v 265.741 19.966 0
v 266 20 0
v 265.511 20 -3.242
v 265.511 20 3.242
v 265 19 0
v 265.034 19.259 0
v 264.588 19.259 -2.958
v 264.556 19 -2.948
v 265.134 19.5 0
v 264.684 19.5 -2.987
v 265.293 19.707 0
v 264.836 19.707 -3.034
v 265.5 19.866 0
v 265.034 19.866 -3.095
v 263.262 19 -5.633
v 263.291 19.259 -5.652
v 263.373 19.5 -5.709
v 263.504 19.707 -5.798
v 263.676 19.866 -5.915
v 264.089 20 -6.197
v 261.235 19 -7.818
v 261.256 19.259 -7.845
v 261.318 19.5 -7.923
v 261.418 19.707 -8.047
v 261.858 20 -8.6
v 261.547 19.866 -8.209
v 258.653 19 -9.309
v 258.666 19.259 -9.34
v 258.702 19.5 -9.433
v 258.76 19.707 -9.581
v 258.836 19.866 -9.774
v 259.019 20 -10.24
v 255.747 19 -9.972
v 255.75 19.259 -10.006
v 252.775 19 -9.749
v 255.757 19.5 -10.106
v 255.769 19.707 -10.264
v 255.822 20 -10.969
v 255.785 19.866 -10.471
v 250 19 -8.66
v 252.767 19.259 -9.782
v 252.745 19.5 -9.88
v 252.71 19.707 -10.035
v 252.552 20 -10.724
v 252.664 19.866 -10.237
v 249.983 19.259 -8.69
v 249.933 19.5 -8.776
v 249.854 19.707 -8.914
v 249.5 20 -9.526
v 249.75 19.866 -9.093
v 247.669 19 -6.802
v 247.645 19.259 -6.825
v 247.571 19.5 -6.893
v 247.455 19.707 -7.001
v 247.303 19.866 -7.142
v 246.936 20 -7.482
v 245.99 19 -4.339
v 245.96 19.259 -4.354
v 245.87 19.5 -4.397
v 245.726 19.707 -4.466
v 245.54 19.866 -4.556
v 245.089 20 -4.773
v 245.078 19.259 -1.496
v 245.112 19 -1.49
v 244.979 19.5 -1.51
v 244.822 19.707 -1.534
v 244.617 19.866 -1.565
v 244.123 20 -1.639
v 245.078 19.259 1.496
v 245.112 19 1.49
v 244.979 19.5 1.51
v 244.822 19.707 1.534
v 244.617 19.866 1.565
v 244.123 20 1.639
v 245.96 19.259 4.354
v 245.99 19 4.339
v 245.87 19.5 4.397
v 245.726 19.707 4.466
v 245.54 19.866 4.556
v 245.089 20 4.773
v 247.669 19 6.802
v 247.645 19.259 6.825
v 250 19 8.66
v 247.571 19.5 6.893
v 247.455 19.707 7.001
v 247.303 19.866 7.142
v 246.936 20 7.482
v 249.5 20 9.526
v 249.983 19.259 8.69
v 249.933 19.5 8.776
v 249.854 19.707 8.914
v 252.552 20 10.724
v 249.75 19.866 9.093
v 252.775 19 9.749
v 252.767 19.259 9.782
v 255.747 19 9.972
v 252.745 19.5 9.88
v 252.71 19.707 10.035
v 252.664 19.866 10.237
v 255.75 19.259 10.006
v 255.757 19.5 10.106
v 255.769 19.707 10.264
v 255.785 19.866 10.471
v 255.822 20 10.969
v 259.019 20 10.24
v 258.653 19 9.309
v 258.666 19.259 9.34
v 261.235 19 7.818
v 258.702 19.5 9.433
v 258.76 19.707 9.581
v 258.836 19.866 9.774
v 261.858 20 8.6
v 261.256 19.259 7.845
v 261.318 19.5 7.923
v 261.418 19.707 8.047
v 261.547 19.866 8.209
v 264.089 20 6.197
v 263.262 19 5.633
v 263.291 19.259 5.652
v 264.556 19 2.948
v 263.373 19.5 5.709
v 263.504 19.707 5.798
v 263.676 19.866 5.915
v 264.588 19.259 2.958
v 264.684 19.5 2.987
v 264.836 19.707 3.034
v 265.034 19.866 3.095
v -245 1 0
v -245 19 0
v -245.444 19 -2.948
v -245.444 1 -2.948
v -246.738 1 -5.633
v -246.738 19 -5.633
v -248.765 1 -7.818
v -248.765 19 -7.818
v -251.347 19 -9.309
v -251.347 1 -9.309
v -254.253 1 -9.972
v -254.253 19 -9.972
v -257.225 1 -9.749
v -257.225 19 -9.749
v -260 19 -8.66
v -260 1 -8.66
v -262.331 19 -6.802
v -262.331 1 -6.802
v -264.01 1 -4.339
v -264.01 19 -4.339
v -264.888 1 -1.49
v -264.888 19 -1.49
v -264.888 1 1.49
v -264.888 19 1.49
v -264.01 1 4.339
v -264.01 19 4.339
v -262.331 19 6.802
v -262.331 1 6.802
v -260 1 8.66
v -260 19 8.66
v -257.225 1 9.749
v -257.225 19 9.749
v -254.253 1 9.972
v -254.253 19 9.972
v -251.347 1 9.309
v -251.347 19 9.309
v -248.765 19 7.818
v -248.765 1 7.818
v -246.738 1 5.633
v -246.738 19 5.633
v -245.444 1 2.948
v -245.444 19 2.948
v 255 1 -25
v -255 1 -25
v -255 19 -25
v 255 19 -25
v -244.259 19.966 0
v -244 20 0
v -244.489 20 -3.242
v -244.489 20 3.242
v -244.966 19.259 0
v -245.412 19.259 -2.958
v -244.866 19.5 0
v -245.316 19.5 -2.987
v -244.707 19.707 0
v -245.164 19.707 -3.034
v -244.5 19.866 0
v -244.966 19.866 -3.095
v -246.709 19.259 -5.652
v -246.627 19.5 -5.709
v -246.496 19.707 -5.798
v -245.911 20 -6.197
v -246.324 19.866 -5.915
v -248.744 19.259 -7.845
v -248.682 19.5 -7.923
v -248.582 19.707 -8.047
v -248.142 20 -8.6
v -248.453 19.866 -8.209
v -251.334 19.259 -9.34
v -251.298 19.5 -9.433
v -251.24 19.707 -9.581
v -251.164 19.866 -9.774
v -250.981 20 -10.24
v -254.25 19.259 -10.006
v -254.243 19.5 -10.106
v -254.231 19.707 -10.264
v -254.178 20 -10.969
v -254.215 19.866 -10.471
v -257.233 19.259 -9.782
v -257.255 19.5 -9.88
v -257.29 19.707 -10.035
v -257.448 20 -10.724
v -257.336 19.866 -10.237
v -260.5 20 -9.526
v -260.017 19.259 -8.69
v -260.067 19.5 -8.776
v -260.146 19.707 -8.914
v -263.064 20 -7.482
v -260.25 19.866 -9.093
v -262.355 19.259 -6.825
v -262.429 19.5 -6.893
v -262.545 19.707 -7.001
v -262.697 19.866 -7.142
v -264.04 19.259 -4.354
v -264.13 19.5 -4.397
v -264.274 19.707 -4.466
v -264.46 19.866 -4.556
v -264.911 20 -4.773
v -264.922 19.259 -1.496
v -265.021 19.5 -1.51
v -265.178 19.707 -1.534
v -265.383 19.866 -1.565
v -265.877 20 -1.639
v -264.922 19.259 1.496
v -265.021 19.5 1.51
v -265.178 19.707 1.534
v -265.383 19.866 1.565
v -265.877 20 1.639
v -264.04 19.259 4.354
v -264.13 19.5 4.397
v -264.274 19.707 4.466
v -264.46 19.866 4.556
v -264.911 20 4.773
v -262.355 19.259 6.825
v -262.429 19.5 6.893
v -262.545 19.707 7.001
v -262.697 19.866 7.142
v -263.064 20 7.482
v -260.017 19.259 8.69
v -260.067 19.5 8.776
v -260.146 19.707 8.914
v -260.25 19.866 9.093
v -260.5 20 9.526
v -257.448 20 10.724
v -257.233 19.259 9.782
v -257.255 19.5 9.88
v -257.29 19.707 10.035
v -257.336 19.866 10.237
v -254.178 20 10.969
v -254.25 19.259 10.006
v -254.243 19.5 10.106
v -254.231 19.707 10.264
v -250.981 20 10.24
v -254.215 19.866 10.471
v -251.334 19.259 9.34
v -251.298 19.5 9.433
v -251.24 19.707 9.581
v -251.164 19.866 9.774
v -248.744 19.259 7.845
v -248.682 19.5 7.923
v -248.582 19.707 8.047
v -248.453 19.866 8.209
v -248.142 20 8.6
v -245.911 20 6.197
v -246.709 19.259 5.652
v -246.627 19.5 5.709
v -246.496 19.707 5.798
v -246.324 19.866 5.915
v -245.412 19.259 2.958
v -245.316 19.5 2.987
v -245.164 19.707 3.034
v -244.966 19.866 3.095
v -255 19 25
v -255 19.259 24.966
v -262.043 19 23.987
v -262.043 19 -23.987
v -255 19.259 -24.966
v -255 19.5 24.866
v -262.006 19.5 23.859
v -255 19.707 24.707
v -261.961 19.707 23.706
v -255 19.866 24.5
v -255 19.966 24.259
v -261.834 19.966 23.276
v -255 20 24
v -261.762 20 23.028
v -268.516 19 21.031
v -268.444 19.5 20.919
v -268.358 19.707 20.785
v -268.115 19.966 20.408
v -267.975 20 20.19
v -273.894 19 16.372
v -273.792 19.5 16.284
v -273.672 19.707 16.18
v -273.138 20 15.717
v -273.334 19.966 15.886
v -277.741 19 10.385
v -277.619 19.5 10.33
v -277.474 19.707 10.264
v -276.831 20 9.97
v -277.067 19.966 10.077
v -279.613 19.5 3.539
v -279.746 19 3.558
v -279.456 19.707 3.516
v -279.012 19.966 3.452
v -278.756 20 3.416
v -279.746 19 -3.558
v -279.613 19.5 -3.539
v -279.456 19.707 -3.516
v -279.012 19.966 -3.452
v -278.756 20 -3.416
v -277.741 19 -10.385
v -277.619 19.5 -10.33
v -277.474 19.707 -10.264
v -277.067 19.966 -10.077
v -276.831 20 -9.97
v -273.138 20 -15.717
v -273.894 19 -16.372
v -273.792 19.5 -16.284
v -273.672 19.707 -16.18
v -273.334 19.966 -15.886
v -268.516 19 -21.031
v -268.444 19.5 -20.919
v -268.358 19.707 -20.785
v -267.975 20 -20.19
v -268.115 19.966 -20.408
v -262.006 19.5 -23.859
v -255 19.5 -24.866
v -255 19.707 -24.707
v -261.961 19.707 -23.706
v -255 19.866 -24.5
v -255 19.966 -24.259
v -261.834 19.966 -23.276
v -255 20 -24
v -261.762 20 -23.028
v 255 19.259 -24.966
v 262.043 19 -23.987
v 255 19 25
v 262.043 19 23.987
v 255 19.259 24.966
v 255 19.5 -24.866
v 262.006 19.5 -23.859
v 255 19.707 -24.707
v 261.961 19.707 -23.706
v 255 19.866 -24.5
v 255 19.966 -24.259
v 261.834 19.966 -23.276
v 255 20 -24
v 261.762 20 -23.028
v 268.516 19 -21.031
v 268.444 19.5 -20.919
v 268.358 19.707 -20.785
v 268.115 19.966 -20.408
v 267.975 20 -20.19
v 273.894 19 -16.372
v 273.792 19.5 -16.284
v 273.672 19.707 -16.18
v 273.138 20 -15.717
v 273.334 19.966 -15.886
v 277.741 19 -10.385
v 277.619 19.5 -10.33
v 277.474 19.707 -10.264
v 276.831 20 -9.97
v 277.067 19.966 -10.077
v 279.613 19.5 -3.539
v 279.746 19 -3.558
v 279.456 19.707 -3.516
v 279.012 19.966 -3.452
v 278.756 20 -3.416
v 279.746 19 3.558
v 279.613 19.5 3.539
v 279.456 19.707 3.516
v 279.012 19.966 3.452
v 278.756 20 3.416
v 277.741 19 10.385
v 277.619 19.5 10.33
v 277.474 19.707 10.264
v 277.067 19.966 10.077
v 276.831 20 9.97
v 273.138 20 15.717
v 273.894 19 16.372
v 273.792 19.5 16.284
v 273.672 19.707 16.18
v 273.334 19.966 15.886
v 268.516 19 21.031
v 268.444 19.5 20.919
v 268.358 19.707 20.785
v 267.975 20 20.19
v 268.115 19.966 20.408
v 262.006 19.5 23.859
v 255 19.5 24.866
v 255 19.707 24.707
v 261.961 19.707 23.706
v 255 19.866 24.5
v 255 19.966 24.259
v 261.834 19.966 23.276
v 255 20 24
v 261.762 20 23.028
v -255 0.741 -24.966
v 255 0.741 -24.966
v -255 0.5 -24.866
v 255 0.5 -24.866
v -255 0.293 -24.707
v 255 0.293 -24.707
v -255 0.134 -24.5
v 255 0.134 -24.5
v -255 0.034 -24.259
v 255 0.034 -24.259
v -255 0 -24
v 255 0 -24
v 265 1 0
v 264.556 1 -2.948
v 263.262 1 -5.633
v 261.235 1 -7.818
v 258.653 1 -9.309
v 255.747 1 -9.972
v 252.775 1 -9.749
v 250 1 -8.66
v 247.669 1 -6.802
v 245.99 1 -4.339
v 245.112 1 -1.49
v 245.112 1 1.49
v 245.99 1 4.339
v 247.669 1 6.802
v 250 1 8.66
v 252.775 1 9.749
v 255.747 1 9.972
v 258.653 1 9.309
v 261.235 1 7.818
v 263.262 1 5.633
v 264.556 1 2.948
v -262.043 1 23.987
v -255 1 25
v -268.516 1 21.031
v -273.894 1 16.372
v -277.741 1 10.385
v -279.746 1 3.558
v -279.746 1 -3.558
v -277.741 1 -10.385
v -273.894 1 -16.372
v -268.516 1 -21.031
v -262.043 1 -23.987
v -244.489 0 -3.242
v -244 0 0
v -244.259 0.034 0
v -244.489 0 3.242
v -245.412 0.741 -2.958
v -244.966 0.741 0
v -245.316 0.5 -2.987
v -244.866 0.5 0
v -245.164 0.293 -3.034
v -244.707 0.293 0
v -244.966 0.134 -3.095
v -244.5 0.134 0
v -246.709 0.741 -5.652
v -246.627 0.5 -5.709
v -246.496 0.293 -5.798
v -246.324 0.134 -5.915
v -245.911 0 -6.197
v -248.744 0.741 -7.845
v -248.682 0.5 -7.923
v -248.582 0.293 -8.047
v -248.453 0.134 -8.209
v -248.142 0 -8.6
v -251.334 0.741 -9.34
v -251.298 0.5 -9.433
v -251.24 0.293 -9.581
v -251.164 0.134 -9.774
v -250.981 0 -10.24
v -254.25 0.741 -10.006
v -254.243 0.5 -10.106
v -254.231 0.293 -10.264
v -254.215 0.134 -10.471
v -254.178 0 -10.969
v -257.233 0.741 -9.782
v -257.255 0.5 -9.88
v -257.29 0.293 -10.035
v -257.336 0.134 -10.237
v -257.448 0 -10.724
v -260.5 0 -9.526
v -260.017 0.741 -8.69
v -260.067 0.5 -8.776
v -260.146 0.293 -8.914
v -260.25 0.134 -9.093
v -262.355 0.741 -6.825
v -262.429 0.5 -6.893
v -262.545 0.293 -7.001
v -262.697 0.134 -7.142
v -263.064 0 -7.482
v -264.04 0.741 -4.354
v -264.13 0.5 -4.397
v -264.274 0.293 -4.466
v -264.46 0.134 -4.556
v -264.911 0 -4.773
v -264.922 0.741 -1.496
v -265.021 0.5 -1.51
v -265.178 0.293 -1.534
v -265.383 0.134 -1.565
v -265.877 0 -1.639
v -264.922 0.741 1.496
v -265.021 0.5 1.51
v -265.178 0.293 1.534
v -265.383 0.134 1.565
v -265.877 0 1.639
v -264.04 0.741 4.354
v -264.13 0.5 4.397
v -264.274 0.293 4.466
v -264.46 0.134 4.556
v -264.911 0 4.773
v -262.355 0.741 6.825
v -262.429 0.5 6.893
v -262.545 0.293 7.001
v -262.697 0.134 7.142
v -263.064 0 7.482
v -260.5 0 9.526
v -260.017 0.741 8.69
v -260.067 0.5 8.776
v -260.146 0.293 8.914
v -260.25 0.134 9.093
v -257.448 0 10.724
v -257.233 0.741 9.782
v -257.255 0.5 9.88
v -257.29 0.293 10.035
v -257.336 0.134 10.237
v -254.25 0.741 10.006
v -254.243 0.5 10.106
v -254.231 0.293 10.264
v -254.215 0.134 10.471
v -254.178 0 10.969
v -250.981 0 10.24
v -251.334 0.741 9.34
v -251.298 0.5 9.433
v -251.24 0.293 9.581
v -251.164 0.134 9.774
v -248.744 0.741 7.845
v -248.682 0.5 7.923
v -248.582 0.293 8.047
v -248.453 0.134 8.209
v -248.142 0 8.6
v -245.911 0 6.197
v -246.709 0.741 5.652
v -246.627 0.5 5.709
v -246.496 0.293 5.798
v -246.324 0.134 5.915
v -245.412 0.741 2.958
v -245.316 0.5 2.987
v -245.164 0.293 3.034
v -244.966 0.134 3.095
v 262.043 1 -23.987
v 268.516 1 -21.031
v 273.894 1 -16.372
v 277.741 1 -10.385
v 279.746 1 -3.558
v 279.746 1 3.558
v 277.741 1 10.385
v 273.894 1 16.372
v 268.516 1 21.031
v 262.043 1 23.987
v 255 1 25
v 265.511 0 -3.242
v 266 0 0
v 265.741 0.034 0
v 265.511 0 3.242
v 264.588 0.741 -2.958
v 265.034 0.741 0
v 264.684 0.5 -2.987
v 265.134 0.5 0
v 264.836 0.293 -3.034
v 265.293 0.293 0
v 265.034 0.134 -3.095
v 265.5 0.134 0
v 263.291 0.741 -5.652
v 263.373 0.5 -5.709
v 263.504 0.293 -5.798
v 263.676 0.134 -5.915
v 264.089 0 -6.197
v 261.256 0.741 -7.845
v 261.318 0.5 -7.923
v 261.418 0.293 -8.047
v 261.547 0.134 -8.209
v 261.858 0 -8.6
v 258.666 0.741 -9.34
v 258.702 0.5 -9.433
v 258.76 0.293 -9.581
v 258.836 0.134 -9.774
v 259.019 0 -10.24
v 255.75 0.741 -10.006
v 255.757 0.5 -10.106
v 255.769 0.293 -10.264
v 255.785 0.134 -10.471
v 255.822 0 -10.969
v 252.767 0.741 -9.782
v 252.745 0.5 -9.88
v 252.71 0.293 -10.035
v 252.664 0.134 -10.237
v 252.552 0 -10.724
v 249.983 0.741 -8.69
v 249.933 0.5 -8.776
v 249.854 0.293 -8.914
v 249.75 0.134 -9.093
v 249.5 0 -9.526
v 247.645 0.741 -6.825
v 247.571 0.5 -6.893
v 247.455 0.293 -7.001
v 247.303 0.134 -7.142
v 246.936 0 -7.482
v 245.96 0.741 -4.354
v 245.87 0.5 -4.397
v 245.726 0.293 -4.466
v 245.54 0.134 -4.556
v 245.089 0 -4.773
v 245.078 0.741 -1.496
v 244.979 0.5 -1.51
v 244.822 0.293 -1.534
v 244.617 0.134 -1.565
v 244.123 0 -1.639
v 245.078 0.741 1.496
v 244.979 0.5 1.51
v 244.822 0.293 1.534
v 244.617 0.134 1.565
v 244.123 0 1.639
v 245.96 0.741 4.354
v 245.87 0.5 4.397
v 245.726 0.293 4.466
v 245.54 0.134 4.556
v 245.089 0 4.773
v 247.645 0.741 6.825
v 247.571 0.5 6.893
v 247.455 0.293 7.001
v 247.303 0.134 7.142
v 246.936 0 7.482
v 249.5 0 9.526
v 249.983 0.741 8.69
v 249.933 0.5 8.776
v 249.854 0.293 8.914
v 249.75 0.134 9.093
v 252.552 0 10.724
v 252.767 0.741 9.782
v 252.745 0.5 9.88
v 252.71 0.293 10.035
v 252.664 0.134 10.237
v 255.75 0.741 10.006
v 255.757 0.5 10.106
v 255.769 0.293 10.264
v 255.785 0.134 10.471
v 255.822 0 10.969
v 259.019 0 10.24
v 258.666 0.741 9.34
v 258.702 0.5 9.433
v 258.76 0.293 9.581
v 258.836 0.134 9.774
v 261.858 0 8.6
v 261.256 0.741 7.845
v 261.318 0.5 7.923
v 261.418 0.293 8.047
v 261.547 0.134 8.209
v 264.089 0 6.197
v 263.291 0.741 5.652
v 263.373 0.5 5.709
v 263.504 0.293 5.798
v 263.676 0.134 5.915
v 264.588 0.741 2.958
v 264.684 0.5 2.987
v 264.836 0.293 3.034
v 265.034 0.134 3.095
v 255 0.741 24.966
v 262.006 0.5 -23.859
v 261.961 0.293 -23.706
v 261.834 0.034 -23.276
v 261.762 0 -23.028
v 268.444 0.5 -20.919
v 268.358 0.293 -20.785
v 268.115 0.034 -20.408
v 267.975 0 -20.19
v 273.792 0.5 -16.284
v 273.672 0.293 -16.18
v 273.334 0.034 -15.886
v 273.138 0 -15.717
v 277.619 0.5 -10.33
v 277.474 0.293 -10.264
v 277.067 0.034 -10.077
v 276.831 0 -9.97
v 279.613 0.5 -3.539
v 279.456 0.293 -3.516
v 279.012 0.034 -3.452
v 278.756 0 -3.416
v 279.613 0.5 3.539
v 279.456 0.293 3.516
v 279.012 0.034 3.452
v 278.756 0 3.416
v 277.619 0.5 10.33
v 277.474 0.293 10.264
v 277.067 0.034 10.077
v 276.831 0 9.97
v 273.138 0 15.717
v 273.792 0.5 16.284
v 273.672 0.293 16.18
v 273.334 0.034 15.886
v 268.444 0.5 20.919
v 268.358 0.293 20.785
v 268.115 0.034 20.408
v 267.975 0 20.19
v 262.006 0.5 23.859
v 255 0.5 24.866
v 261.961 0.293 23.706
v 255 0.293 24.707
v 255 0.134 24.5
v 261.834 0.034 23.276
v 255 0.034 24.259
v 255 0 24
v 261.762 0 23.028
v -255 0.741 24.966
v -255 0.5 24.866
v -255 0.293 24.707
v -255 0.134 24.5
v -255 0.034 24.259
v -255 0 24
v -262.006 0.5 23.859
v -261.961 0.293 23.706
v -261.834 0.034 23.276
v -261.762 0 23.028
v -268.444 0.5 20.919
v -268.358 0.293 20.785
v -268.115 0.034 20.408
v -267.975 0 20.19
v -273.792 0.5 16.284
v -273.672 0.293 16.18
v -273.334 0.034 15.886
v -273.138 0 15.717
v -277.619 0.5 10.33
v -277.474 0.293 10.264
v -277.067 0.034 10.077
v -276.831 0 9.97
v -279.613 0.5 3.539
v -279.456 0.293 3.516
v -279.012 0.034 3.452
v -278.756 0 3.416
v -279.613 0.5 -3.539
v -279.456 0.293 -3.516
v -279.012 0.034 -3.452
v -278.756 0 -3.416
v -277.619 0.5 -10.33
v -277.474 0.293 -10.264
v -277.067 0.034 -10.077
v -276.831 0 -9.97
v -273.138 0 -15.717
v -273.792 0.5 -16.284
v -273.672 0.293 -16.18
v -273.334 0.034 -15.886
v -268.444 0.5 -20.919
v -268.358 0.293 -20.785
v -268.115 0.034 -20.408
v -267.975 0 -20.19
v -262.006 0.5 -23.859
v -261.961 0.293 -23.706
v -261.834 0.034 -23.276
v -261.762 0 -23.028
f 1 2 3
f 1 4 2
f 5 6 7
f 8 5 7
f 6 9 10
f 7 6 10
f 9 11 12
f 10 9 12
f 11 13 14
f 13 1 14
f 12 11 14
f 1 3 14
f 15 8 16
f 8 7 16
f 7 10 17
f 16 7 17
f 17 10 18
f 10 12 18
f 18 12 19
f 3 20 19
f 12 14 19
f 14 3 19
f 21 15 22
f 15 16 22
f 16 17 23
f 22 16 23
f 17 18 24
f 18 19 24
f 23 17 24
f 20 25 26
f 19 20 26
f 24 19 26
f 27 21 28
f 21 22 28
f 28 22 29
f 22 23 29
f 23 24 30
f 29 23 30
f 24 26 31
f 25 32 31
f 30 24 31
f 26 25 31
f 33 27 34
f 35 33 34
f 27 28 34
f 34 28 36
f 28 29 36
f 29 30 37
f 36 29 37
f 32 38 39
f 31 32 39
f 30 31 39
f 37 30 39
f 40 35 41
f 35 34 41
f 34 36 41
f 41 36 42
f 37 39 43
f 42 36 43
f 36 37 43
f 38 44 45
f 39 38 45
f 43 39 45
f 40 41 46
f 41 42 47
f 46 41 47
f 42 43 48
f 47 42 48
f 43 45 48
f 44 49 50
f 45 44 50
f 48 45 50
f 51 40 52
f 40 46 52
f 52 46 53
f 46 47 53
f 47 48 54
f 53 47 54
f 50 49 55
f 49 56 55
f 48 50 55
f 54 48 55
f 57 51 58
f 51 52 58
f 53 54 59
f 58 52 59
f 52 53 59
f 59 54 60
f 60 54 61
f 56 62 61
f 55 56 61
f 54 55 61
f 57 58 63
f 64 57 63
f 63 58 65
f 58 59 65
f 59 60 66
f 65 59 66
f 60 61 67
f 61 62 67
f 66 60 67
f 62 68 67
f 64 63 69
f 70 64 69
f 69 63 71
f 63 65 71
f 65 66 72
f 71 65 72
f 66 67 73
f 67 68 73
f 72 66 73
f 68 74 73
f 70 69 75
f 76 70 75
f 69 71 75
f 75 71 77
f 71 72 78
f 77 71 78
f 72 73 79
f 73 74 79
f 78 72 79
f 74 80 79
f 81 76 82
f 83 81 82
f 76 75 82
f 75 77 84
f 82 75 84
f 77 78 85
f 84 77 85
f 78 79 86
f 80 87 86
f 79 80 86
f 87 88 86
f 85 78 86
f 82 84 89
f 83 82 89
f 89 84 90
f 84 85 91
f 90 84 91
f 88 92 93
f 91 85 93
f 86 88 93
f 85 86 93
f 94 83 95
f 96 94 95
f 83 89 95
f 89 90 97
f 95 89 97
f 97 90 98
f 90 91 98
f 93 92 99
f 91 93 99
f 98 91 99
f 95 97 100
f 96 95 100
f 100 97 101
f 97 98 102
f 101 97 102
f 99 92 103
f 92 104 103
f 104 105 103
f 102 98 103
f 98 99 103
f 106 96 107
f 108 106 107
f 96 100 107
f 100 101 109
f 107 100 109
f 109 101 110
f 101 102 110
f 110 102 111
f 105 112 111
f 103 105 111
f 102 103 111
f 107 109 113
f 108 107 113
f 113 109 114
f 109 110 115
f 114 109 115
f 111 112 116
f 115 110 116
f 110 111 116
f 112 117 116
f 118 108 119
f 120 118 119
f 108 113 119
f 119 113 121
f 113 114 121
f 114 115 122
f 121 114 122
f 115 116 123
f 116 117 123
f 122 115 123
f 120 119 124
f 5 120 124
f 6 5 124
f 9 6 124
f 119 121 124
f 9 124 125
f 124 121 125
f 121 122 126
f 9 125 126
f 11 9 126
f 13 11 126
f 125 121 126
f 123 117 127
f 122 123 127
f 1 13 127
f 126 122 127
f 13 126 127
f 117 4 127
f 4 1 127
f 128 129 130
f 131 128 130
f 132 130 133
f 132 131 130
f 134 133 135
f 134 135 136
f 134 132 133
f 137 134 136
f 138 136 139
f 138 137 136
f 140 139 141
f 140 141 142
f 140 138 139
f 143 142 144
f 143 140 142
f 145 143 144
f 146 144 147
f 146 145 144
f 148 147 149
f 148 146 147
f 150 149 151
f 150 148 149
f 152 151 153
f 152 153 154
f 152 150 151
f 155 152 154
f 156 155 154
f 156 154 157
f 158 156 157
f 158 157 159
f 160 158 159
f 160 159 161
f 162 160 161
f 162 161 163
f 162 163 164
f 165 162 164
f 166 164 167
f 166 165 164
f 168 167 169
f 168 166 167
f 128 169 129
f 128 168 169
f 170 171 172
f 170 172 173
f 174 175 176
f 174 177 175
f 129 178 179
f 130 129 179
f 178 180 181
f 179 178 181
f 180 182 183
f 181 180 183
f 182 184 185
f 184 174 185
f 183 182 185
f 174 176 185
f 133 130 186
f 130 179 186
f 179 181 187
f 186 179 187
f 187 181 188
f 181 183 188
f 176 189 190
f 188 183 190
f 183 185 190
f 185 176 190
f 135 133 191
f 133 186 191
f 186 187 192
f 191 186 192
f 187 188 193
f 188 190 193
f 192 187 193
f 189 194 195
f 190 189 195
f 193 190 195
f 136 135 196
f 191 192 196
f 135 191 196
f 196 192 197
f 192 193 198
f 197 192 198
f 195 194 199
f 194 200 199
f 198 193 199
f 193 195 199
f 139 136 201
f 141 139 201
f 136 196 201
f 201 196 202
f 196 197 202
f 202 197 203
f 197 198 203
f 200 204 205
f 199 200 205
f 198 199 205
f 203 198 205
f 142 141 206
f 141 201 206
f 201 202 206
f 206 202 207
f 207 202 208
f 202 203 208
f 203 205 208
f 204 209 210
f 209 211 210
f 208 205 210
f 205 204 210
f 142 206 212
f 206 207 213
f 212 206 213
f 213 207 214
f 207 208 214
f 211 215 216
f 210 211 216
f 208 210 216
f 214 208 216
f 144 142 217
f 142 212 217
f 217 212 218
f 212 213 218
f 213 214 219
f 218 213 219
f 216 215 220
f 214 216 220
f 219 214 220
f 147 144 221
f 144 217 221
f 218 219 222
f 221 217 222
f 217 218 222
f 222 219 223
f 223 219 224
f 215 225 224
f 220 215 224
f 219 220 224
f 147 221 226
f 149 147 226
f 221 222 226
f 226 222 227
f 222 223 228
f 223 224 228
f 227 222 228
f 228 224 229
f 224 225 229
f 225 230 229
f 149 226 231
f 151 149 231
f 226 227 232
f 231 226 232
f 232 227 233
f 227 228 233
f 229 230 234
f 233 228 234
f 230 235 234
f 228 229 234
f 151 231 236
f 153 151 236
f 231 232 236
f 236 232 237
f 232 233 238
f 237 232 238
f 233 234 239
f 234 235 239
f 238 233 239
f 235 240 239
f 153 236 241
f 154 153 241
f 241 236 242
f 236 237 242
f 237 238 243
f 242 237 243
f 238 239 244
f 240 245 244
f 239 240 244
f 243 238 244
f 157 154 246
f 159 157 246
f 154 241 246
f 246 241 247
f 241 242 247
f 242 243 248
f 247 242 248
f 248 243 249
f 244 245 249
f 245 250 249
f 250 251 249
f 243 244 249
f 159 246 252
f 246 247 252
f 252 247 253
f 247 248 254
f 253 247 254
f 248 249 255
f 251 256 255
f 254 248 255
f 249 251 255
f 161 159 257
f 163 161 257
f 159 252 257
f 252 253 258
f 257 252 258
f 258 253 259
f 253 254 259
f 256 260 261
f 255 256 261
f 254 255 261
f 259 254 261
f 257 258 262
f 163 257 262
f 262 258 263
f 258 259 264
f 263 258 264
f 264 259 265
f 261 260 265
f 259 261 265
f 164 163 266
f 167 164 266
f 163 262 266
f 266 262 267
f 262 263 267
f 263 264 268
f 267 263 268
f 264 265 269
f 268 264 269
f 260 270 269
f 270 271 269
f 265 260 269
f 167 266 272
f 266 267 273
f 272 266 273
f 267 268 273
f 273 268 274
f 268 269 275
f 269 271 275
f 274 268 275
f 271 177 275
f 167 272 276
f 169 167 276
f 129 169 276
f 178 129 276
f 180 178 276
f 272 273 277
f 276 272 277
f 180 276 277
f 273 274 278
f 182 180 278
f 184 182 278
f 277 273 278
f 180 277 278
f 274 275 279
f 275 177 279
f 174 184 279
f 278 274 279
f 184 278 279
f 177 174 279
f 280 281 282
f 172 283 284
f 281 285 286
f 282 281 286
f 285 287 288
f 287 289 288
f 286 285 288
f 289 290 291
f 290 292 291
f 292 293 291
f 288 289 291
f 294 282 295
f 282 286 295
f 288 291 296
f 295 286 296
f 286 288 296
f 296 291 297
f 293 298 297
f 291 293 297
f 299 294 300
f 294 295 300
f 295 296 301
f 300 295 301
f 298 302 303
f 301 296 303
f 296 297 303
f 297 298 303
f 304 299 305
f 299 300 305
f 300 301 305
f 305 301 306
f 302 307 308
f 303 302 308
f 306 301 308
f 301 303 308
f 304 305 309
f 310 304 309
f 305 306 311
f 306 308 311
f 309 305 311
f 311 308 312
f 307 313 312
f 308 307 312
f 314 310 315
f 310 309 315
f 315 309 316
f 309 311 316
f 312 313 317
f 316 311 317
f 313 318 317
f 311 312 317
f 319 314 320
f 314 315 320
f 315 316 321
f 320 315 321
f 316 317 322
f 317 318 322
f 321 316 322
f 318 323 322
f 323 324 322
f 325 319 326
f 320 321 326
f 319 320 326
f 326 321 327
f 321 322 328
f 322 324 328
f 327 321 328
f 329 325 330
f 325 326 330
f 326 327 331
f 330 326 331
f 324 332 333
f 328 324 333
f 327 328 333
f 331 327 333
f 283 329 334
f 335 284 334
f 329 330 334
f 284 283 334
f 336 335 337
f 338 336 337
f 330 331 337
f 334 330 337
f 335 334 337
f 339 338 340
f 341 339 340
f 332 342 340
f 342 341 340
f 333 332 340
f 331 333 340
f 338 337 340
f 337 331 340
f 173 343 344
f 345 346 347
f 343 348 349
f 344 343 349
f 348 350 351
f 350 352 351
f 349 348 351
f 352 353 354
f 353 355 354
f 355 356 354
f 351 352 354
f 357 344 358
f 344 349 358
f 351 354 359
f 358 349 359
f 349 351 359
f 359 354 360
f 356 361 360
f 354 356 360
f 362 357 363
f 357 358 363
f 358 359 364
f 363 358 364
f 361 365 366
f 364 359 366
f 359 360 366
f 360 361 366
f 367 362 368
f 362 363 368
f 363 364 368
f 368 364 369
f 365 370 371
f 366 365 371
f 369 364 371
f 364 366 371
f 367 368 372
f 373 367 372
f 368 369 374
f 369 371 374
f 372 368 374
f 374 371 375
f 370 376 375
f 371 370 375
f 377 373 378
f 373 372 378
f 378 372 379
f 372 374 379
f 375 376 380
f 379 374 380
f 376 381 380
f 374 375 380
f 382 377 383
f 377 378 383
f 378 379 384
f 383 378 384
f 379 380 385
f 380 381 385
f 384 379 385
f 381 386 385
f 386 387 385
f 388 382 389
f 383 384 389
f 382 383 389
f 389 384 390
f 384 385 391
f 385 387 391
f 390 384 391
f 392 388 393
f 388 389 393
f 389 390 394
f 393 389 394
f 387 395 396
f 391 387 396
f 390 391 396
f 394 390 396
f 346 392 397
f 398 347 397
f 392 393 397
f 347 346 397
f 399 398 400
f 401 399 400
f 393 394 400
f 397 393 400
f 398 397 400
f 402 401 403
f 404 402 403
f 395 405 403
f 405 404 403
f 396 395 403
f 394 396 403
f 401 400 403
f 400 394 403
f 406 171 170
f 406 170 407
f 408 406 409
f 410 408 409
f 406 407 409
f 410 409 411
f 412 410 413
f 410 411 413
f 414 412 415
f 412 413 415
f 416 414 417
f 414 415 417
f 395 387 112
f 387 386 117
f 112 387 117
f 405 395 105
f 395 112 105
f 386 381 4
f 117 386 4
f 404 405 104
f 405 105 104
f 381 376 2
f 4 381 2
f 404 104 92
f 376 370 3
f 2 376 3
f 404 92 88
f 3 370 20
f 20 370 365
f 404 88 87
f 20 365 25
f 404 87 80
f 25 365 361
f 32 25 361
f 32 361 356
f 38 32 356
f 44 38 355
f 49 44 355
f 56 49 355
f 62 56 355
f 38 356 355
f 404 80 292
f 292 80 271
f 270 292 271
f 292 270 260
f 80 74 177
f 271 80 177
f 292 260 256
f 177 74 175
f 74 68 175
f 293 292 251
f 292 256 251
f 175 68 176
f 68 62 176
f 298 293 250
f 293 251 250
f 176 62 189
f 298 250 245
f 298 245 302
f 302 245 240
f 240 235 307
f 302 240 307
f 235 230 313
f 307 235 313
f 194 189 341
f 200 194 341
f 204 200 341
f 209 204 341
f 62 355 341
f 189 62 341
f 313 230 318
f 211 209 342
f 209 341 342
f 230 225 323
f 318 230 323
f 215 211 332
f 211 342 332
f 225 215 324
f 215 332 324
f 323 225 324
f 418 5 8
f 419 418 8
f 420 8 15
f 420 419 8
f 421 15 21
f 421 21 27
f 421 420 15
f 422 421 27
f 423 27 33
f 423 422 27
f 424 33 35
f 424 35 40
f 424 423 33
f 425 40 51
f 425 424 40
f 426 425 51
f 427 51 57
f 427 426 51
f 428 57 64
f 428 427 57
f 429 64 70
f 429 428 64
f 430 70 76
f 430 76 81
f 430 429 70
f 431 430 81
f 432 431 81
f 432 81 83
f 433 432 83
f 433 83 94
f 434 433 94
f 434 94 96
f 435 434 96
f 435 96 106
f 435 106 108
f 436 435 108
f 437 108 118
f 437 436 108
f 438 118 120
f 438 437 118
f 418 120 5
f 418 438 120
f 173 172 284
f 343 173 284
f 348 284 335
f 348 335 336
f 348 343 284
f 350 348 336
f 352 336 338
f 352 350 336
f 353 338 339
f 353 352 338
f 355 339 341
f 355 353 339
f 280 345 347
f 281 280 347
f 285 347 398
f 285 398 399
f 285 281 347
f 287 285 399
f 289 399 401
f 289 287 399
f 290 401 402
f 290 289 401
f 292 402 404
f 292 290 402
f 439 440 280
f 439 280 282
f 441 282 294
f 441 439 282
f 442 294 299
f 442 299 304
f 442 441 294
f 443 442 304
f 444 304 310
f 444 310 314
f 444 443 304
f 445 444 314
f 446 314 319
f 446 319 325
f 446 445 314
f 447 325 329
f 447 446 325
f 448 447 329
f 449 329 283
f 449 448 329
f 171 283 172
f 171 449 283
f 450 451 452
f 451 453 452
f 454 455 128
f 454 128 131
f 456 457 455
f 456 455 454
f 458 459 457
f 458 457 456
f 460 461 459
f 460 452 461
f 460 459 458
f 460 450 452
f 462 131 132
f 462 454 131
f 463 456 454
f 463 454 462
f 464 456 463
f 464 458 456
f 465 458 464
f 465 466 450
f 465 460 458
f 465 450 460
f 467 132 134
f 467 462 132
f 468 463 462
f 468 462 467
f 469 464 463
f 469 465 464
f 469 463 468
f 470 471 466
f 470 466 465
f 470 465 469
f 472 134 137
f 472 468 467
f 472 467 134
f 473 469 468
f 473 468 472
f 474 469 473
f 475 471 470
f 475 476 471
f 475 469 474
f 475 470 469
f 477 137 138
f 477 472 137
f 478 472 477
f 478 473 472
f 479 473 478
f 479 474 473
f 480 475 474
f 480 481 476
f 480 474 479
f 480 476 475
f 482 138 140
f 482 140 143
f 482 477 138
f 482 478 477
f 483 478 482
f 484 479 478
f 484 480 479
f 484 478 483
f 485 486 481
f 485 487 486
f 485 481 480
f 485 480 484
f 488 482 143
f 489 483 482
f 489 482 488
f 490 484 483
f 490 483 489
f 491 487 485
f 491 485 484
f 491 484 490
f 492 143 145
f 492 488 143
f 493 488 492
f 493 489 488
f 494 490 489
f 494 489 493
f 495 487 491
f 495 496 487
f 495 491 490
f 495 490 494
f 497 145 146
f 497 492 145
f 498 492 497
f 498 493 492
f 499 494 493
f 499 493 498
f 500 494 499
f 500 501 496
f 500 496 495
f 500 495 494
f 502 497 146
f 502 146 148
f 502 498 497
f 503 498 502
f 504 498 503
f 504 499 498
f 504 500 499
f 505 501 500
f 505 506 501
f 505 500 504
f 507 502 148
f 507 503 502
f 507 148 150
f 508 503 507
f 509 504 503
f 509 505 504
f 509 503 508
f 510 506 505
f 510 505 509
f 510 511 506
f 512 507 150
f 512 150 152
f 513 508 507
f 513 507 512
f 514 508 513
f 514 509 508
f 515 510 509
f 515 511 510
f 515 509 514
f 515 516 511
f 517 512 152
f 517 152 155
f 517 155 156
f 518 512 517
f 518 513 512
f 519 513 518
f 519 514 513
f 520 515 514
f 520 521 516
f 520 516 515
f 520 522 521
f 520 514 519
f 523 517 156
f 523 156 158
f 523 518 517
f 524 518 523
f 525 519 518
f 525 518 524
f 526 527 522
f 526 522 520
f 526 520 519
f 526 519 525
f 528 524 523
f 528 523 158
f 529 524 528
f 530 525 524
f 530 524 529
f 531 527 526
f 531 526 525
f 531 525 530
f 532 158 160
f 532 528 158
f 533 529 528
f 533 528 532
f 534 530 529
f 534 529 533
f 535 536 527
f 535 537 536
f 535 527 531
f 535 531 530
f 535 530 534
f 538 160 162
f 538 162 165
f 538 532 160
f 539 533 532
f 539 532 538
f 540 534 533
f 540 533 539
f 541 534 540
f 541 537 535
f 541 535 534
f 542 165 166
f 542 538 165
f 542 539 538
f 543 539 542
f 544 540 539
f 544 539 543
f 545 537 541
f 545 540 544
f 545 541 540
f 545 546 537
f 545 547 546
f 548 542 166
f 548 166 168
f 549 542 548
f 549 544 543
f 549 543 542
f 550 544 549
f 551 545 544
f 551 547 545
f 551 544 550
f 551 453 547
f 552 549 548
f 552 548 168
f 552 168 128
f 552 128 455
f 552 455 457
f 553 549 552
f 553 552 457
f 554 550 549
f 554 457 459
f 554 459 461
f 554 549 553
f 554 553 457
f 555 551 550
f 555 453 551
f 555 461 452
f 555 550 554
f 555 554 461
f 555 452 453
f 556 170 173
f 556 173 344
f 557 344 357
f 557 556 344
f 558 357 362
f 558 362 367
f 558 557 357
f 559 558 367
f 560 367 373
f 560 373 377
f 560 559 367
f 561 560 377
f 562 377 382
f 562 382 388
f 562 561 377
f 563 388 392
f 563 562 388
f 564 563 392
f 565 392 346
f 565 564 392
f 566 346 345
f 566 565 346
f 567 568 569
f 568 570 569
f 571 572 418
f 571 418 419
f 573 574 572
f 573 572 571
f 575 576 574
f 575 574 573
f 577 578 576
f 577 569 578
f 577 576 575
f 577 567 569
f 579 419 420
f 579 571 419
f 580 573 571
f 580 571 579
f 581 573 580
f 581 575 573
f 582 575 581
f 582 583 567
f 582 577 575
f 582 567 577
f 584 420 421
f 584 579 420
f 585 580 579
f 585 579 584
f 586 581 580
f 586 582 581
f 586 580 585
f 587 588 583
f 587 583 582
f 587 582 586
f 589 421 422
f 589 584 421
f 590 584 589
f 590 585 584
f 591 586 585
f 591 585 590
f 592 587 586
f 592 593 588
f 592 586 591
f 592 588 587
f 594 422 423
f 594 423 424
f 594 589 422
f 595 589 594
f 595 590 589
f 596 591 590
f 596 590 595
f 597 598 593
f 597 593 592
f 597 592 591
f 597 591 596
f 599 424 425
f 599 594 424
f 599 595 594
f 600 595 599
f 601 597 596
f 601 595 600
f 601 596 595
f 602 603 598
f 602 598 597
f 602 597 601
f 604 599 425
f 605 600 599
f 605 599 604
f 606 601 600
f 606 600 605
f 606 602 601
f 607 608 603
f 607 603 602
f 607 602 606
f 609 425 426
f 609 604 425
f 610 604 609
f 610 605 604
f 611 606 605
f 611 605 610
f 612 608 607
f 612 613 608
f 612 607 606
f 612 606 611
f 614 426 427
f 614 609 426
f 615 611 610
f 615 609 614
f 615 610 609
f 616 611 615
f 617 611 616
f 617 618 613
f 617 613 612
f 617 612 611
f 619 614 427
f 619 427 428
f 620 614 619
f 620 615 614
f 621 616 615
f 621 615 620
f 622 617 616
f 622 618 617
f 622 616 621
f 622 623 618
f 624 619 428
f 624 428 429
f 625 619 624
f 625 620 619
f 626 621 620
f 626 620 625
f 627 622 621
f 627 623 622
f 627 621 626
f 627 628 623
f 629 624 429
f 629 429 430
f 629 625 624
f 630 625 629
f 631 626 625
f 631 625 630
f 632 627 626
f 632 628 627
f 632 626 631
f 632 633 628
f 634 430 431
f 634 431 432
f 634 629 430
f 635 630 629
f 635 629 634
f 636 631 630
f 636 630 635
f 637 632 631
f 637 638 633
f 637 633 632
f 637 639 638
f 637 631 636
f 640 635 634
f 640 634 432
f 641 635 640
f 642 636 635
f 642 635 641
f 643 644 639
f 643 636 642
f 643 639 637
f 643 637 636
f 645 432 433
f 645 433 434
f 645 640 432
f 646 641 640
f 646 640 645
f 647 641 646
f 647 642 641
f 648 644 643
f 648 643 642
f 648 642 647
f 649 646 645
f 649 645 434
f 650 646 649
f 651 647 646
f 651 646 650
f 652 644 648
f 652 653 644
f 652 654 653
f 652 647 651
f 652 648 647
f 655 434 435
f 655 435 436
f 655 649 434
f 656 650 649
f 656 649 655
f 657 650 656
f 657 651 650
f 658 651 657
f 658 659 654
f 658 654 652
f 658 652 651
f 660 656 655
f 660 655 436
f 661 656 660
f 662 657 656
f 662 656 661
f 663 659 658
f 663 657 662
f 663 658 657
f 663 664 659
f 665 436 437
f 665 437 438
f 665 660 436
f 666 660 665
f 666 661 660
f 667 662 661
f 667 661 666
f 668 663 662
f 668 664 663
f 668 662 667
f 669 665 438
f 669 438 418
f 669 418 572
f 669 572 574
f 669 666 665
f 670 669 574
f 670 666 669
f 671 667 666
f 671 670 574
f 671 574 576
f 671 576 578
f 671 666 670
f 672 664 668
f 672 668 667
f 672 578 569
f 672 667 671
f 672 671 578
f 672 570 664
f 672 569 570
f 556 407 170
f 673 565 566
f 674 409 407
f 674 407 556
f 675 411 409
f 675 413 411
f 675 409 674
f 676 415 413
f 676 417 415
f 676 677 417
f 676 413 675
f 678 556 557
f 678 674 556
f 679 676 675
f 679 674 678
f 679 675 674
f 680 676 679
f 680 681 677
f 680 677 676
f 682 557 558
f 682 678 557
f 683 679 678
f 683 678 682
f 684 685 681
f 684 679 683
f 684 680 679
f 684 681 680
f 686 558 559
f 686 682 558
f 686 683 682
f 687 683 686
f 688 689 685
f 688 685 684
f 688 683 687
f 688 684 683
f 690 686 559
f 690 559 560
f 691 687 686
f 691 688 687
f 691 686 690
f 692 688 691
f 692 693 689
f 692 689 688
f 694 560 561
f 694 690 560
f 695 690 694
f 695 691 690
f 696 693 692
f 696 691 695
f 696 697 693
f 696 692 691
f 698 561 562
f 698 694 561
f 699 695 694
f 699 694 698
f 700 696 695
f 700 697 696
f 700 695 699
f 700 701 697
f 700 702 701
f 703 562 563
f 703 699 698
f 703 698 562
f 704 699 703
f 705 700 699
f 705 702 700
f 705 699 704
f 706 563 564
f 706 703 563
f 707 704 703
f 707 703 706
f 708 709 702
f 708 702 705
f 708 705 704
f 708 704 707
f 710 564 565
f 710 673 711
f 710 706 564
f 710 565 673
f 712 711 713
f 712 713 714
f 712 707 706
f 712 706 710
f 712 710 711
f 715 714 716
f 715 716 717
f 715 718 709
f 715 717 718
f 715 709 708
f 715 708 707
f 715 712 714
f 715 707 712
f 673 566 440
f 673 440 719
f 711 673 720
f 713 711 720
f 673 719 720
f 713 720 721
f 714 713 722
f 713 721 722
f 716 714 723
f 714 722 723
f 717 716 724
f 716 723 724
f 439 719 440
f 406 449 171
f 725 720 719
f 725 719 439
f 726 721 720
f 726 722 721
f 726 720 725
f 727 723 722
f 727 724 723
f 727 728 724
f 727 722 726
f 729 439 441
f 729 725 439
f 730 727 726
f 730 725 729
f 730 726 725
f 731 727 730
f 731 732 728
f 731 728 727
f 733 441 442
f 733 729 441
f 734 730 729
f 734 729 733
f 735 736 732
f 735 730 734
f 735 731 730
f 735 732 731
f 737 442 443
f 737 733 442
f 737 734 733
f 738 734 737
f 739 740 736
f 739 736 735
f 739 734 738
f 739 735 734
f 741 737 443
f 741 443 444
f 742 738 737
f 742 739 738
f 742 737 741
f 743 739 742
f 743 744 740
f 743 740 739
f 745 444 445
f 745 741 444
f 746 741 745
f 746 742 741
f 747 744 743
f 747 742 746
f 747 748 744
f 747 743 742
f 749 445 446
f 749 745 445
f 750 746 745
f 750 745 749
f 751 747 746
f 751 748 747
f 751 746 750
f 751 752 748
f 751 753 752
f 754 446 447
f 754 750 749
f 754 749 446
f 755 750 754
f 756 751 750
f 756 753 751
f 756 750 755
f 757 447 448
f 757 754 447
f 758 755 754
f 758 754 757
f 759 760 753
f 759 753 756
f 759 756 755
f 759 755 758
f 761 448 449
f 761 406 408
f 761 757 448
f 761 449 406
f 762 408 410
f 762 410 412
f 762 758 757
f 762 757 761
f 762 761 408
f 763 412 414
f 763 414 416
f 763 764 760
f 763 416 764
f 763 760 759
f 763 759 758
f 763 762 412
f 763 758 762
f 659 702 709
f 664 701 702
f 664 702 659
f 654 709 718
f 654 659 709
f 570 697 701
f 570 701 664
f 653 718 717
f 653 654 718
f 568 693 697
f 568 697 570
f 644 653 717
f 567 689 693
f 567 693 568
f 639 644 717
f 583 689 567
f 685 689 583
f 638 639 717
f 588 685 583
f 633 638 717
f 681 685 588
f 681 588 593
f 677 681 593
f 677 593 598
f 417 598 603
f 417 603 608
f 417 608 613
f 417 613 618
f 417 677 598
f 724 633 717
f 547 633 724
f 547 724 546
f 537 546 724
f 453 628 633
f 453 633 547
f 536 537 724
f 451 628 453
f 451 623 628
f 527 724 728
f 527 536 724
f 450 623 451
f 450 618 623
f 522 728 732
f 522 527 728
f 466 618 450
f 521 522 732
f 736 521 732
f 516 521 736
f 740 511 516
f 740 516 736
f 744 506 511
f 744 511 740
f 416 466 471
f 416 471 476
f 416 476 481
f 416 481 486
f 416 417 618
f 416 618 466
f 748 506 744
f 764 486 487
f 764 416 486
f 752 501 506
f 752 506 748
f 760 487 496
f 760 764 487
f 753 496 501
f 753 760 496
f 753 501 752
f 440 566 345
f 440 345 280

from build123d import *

# Parameters (mm, degrees)
SKETCH1_R           = 10
BOSS_EXTRUDE1_DEPTH = 20
FILLET1_R           = 1


with BuildPart() as part:
    # Sketch1 → Boss-Extrude1 (new body)
    with BuildSketch(Plane(origin=(0, 0, 0), x_dir=(1, 0, 0), z_dir=(0, 1, 0))):
        with BuildLine():
            Line((-255, 25), (255, 25))
            ThreePointArc((255, 25), (280, 0), (255, -25))
            Line((255, -25), (-255, -25))
            ThreePointArc((-255, -25), (-280, 0), (-255, 25))
        make_face()
        with Locations((-255, 0)):
            Circle(SKETCH1_R, mode=Mode.SUBTRACT)
        with Locations((255, 0)):
            Circle(SKETCH1_R, mode=Mode.SUBTRACT)
    extrude(amount=BOSS_EXTRUDE1_DEPTH)

    # Fillet1
    fillet1_edges = [part.edges().sort_by_distance(p)[0] for p in [
        (-265, 0, 0),
        (-265, 20, 0),
        (280, 20, 0),
        (245, 0, 0),
        (245, 20, 0),
        (0, 20, -25),
        (-280, 20, 0),
        (0, 0, -25),
        (280, 0, 0),
        (0, 0, 25),
        (-280, 0, 0),
        (0, 20, 25),
    ]]
    fillet(fillet1_edges, radius=FILLET1_R)


solid = part.part
